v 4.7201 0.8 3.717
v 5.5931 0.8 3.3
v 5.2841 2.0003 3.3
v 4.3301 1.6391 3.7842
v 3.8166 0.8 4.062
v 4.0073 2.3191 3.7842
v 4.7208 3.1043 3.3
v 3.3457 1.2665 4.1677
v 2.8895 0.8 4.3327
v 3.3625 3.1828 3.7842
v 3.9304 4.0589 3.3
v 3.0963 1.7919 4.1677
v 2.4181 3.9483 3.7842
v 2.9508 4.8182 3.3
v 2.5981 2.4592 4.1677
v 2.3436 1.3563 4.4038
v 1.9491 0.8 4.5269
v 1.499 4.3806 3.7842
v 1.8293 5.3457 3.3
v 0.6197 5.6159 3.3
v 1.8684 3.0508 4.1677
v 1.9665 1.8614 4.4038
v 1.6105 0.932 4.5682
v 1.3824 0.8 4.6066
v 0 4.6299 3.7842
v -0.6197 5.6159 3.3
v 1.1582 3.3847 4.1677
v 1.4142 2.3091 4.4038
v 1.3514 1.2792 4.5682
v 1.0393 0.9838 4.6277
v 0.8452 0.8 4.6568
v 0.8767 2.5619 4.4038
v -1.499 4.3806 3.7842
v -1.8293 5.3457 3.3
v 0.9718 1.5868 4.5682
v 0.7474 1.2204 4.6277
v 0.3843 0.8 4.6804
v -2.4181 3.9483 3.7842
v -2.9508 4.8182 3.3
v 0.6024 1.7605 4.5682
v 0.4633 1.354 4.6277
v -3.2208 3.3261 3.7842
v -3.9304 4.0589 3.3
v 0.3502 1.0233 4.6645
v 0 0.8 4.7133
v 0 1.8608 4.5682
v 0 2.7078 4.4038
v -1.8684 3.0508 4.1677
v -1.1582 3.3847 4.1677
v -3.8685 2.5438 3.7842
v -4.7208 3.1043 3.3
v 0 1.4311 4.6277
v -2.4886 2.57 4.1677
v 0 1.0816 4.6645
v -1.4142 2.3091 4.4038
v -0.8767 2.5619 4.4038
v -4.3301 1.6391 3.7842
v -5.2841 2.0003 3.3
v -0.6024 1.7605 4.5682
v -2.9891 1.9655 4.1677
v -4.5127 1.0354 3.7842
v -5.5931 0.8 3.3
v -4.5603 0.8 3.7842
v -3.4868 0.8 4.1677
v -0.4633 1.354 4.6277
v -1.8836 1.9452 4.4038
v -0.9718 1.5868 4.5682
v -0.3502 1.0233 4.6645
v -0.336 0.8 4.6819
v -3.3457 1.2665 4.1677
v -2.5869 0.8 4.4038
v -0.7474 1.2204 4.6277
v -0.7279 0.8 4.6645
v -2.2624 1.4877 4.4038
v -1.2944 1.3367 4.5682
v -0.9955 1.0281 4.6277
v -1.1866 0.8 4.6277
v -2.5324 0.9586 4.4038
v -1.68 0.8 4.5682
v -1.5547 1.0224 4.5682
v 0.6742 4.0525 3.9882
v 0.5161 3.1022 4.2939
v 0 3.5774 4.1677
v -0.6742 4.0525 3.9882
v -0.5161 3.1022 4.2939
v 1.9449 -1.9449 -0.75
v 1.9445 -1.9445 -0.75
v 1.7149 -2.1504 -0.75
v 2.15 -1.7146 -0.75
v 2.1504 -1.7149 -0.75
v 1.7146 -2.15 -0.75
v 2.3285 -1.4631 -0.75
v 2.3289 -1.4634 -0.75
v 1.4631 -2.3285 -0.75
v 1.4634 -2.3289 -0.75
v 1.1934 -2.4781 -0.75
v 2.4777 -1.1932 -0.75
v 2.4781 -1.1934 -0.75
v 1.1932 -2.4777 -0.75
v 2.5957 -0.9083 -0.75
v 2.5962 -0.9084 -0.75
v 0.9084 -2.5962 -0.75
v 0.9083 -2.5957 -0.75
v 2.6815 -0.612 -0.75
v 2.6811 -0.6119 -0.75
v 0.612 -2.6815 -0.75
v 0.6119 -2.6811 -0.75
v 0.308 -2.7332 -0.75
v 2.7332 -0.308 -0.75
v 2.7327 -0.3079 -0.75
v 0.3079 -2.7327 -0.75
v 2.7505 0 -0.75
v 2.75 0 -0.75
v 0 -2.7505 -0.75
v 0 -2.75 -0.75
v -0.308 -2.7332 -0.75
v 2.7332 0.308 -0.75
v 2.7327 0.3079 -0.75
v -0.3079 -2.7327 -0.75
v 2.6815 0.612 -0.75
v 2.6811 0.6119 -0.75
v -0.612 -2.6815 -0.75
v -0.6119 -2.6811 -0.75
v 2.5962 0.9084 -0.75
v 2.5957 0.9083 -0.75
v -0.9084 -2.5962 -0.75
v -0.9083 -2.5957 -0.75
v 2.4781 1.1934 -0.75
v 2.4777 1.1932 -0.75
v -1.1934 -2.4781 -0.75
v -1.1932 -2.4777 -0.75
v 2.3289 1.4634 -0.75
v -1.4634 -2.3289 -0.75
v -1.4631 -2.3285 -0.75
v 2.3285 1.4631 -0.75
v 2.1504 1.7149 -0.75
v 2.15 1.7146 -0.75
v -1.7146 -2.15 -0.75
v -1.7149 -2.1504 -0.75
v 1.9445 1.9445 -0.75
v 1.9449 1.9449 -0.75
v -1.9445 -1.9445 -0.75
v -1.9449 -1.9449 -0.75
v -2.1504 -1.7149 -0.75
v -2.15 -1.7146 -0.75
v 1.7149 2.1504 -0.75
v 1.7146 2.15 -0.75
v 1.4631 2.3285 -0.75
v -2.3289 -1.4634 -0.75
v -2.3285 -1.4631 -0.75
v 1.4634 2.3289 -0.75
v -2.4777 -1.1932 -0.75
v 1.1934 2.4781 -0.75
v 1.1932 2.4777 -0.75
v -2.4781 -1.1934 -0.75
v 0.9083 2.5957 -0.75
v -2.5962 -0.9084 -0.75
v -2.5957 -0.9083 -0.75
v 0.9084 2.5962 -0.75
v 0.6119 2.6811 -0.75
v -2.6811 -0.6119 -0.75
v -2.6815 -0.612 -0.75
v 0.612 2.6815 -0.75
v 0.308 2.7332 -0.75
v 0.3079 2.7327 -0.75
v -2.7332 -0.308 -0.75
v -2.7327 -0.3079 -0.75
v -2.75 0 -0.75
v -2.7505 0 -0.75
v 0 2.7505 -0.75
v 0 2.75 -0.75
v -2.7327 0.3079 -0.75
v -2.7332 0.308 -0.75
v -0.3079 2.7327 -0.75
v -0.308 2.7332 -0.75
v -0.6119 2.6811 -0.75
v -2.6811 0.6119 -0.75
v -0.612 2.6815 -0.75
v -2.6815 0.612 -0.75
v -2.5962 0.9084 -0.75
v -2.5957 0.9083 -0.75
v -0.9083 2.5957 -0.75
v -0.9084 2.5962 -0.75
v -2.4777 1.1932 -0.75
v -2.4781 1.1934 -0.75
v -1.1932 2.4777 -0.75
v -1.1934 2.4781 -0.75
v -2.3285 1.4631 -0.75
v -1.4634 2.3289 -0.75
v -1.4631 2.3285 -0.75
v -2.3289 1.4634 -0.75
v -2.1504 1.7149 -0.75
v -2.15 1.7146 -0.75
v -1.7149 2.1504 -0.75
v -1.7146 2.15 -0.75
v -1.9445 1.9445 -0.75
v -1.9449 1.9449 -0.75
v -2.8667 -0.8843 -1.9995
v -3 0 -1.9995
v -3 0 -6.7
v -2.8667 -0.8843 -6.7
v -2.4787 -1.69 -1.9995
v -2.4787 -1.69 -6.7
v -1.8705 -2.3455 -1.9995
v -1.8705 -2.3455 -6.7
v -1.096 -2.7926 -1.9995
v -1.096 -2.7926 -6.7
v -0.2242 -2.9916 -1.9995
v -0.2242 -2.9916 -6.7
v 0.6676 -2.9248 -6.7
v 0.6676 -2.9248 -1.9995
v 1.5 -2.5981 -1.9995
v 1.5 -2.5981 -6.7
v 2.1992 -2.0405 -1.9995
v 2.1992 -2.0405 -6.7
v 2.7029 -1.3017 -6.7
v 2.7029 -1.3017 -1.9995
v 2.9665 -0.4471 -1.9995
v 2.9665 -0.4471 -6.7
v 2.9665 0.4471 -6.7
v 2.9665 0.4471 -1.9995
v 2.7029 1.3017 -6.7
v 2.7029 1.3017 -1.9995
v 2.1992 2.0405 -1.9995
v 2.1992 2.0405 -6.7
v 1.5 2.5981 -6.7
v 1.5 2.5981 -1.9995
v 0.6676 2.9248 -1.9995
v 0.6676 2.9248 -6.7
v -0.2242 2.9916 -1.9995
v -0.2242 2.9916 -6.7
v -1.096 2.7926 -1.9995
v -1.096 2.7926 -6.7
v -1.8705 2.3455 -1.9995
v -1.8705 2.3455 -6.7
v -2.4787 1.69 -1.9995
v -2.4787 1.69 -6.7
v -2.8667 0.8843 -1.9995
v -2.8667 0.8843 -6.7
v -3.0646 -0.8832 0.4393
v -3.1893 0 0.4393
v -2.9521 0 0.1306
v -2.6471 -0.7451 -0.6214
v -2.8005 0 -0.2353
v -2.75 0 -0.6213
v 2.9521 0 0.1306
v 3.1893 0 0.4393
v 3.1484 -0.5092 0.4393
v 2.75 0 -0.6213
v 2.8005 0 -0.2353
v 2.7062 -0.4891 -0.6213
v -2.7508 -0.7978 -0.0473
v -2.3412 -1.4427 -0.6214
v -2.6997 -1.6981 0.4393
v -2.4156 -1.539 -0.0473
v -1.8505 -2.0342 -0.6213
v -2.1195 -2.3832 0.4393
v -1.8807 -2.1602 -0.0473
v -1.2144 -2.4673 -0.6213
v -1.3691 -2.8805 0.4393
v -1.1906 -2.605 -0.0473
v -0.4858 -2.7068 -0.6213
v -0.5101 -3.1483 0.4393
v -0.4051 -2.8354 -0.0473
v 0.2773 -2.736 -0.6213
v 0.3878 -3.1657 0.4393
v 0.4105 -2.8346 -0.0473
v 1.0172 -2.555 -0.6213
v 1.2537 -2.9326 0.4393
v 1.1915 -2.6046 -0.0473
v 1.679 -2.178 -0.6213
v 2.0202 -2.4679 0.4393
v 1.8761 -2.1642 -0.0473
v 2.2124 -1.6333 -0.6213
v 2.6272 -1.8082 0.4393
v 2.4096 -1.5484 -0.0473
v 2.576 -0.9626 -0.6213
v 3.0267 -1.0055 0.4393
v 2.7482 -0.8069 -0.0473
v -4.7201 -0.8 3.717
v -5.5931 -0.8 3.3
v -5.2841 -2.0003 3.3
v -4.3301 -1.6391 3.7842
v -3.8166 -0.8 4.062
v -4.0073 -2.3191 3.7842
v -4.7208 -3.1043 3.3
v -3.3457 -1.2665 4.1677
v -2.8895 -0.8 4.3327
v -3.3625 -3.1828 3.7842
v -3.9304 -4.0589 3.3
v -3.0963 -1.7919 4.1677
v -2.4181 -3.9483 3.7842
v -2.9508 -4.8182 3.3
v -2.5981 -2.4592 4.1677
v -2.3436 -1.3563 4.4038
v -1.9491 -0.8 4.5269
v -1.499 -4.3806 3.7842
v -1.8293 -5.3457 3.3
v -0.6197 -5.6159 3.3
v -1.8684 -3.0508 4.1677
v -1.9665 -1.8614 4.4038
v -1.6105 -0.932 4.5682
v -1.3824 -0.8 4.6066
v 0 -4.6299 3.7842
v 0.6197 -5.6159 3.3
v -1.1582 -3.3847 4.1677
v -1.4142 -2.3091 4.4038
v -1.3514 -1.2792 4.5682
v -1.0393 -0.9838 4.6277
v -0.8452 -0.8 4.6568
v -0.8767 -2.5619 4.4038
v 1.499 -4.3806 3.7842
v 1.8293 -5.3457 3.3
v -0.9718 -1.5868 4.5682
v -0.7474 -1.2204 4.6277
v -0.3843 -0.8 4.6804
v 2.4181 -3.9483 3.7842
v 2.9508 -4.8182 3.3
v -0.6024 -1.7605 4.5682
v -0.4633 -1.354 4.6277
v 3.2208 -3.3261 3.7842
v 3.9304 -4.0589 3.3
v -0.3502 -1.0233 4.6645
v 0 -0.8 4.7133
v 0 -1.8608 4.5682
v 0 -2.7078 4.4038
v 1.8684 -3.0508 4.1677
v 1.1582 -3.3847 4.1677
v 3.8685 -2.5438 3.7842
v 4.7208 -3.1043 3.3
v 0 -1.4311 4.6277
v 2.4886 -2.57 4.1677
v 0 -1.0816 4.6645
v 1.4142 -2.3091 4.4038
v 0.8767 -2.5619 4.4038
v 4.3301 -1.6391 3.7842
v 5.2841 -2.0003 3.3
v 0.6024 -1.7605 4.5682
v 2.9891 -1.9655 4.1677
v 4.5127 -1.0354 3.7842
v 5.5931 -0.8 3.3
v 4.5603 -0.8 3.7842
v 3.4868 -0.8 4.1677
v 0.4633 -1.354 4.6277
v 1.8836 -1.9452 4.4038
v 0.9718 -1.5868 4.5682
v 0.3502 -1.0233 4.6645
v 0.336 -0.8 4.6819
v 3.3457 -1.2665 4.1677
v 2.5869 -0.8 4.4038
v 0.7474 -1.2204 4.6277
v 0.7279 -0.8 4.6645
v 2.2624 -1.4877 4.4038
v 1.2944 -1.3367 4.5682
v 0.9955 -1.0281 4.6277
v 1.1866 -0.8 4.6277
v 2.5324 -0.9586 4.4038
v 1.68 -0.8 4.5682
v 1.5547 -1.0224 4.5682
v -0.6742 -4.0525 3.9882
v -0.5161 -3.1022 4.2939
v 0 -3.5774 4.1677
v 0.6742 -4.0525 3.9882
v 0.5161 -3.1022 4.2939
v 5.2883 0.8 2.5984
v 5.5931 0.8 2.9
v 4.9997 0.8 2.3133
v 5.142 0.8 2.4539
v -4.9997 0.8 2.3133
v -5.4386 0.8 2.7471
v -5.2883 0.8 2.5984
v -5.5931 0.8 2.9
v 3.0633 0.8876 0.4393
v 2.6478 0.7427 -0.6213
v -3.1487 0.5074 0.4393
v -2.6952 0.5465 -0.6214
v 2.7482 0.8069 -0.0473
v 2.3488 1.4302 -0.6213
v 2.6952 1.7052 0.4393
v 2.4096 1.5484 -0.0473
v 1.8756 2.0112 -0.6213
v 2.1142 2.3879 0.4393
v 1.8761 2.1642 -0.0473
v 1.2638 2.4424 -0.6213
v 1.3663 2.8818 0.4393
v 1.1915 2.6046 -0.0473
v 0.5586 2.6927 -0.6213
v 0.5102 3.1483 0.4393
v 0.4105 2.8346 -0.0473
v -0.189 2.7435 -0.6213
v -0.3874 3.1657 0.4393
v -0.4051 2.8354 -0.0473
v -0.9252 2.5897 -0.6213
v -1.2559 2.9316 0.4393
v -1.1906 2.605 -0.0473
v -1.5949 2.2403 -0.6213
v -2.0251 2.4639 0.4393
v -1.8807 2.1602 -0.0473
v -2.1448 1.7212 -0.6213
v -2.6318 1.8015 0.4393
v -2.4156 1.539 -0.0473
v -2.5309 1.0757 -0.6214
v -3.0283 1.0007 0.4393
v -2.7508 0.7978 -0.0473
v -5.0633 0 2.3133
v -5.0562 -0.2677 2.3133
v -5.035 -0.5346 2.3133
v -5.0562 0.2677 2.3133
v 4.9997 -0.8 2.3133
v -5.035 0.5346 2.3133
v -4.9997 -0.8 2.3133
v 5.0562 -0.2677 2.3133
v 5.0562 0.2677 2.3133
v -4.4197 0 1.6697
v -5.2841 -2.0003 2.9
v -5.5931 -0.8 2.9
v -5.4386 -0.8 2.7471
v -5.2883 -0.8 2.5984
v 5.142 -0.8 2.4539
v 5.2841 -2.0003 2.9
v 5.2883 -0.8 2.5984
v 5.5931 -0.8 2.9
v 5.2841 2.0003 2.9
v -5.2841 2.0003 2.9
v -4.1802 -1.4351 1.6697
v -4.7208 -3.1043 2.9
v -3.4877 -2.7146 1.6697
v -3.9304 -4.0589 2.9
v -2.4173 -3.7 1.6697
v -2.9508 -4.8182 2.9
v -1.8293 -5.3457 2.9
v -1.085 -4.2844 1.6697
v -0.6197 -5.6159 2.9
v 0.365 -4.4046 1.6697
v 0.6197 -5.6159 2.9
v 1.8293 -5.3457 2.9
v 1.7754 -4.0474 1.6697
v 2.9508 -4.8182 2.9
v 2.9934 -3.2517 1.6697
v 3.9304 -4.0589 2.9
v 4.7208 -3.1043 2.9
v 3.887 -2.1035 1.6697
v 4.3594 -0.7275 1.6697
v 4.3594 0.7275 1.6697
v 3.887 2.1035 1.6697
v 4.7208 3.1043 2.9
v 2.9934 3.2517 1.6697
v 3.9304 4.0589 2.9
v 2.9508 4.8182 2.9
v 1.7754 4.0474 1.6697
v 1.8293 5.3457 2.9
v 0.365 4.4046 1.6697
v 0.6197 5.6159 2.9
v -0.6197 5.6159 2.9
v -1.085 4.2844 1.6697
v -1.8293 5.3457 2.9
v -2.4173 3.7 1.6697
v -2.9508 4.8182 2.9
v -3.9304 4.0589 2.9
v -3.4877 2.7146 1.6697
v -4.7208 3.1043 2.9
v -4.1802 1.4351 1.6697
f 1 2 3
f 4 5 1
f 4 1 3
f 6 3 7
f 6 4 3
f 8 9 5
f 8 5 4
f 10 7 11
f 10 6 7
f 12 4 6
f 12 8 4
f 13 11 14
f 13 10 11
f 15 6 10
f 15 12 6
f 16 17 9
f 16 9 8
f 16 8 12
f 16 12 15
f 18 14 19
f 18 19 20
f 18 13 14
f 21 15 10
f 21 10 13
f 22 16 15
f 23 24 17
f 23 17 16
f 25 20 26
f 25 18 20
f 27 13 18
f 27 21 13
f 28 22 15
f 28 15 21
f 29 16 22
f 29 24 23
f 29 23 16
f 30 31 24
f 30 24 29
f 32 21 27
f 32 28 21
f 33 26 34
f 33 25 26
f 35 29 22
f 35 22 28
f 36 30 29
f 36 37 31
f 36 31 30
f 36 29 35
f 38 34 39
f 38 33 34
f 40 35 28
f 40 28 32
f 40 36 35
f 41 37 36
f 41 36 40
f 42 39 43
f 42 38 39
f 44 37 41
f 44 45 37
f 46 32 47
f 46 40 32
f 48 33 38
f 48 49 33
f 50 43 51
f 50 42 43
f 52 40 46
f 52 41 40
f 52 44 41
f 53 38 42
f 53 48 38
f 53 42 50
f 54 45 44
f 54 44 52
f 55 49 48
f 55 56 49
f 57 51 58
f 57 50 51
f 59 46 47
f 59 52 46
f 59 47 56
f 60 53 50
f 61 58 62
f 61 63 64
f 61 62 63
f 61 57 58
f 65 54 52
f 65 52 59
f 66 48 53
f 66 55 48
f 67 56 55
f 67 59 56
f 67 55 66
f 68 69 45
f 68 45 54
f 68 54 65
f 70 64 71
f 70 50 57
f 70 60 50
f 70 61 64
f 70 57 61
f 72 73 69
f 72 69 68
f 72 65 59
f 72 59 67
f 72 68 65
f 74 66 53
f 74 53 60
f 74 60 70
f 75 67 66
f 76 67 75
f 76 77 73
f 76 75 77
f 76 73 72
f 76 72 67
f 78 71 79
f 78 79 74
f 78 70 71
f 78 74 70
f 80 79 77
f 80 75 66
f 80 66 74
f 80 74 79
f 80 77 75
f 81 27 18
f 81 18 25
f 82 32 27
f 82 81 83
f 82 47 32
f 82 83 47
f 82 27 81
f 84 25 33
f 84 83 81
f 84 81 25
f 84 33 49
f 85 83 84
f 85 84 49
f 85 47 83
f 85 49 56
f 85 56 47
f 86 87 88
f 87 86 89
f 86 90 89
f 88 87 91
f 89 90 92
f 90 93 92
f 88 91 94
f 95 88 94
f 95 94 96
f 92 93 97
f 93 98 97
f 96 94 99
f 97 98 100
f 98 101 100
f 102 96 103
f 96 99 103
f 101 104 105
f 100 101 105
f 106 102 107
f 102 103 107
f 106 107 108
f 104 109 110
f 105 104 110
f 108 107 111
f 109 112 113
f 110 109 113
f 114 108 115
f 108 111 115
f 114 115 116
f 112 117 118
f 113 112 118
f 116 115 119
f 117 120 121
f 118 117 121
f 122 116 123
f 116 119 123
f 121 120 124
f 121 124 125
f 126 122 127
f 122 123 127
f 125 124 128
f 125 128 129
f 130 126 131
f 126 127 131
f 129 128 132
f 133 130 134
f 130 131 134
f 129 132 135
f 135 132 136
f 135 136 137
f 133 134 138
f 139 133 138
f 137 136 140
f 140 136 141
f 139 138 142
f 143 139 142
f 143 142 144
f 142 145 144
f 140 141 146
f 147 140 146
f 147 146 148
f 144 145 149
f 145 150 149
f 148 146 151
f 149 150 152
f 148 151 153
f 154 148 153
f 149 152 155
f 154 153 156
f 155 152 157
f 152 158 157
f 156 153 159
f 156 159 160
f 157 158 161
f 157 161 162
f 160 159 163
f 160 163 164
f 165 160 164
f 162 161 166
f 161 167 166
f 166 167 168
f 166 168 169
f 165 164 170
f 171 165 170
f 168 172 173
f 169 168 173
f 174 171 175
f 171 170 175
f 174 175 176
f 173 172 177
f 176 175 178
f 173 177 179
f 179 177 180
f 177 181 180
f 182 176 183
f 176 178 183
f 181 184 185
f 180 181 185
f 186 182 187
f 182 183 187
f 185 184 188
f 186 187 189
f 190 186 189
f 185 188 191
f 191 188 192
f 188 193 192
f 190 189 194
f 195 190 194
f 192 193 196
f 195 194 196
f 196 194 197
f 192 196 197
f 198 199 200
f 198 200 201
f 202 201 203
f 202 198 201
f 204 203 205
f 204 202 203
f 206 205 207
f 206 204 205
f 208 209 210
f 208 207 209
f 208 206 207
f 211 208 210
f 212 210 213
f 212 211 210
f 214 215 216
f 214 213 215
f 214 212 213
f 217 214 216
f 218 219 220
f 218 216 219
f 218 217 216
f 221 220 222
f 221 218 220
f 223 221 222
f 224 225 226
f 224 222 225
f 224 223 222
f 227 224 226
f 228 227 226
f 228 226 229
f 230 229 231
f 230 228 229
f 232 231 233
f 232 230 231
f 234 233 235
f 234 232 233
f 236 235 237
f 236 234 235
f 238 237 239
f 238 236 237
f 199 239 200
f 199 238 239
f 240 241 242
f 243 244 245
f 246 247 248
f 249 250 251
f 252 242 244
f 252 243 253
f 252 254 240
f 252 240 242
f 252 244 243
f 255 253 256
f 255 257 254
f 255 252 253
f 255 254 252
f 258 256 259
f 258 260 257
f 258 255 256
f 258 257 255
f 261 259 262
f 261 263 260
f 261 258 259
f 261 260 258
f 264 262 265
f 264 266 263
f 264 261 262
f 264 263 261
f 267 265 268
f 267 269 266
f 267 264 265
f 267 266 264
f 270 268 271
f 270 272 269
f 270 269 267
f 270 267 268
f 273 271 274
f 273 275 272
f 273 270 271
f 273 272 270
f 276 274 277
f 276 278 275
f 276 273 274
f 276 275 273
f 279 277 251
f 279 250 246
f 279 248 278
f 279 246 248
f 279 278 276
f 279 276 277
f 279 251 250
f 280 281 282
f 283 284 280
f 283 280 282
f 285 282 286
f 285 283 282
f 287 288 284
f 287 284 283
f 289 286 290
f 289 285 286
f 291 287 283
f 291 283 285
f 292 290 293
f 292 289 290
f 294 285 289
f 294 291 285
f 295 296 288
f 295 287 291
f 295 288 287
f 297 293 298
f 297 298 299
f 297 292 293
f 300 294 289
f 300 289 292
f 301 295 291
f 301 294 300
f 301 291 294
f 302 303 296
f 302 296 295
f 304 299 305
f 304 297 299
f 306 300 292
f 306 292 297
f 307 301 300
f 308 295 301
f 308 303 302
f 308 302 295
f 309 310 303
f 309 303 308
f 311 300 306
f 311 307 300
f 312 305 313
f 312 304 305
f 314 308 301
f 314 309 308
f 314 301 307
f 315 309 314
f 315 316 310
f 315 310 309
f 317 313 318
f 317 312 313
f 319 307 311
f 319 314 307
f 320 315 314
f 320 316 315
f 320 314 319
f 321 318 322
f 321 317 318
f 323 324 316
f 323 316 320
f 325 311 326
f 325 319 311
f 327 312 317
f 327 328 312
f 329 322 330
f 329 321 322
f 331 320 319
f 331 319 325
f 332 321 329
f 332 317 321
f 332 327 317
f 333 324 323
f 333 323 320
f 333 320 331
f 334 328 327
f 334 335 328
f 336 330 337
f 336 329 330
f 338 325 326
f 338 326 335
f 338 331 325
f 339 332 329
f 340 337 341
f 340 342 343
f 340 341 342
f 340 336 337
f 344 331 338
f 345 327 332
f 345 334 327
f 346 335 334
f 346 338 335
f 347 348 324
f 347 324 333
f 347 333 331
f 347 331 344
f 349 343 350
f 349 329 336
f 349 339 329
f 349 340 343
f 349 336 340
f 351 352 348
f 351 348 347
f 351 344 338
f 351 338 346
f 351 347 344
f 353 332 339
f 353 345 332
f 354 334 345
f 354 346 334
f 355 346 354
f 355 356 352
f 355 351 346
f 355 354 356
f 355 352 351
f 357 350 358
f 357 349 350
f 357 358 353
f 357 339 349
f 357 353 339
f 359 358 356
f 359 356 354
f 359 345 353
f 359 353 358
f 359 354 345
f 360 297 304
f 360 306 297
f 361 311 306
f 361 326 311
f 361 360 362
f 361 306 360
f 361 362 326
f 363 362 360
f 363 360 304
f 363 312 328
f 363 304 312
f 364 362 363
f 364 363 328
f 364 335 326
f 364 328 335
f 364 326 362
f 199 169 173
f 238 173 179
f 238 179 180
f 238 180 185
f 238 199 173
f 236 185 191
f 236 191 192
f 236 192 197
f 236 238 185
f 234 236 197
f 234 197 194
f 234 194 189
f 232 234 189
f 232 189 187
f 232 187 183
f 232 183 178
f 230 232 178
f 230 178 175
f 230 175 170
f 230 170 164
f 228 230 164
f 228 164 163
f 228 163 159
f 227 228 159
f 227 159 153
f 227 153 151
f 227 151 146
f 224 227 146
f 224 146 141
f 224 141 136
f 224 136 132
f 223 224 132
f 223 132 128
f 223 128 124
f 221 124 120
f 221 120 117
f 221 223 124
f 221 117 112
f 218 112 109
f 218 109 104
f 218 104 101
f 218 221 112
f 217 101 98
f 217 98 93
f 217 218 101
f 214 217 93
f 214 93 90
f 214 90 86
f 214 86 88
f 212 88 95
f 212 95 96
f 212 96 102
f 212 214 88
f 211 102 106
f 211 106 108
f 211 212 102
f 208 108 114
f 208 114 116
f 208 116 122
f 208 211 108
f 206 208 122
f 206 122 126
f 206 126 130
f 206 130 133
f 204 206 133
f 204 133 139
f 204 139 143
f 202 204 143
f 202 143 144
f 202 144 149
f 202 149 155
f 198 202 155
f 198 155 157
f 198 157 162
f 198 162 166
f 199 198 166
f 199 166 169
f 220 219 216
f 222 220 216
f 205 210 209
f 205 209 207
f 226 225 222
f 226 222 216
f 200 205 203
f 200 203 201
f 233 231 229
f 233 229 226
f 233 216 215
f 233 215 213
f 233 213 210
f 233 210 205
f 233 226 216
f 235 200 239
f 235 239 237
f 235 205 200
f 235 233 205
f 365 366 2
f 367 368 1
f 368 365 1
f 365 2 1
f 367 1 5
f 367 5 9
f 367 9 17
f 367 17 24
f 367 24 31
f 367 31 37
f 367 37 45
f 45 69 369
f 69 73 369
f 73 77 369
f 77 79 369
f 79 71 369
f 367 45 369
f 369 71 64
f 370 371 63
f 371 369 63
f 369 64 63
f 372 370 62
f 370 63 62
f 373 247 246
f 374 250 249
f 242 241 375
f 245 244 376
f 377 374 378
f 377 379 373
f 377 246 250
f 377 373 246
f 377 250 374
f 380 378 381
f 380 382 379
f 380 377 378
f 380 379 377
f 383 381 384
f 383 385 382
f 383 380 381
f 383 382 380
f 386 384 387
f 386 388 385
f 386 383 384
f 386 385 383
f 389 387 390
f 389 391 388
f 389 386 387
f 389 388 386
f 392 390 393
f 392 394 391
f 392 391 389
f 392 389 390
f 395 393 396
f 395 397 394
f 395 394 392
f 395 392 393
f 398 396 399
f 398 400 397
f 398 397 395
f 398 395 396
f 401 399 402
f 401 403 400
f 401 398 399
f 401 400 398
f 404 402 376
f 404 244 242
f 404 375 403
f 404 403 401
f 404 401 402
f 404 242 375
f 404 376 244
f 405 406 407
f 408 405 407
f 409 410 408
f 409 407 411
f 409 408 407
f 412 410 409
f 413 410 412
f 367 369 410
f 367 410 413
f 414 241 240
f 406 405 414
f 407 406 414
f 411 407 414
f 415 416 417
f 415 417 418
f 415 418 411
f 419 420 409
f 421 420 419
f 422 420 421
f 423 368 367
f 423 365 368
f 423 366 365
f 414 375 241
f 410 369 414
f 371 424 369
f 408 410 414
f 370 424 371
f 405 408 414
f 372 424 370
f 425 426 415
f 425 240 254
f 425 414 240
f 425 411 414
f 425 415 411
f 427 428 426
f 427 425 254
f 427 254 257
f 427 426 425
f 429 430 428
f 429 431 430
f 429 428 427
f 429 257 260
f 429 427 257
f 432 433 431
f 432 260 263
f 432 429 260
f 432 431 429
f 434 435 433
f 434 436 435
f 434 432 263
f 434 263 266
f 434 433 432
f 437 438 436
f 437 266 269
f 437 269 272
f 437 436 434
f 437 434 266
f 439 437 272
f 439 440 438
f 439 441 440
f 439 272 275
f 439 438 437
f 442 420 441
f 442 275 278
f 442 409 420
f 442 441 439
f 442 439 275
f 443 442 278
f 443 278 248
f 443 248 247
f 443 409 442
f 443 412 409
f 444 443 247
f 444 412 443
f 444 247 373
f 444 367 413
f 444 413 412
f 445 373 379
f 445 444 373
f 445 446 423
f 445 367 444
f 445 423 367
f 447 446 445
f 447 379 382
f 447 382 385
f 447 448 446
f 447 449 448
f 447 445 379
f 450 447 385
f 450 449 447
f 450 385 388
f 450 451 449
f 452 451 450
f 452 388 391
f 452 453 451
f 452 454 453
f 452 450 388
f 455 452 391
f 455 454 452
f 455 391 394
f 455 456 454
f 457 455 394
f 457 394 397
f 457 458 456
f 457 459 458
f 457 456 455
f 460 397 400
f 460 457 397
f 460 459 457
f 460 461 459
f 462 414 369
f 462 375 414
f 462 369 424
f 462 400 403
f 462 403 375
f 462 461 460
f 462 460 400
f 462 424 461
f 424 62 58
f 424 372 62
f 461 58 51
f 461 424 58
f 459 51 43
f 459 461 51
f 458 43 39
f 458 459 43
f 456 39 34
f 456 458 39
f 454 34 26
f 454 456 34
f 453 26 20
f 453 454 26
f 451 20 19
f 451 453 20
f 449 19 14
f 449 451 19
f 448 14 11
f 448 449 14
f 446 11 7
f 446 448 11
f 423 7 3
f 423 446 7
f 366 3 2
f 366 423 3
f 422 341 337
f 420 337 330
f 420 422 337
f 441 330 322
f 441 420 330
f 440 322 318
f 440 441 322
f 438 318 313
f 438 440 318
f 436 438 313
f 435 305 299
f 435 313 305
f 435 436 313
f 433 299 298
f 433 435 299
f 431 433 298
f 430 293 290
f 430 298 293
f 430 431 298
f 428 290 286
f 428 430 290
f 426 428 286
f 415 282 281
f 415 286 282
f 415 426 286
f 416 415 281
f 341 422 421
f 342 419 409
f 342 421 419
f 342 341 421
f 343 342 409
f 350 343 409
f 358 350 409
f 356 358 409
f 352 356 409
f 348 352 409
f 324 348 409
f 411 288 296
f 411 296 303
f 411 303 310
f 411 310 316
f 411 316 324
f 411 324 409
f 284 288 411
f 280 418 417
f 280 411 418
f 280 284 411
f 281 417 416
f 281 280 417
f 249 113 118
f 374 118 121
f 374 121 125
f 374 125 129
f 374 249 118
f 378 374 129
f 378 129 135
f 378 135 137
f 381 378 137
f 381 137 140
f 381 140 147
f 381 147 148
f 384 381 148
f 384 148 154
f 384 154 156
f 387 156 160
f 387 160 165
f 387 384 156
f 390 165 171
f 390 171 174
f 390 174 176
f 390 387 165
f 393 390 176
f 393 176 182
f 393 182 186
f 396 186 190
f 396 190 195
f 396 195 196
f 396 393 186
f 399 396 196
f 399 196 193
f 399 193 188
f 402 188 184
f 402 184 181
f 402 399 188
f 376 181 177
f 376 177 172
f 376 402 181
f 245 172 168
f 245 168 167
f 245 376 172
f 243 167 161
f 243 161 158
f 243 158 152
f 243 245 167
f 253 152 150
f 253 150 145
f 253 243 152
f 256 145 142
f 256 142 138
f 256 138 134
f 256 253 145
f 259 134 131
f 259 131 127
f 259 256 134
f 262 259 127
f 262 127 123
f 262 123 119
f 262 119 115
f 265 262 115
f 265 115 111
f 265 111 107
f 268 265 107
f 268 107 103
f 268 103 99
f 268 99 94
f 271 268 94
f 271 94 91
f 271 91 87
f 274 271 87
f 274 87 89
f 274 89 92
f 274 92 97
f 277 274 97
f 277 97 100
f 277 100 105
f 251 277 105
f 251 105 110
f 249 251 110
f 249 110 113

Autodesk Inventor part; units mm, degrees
ref_plane "WorkPlane11" through (0, 0, 0) normal (0, 0, 1) x (1, 0, 0)
ref_plane "Work Plane2" through (0, 0, -5.7) normal (0, 0, 1) x (1, 0, 0)
ref_plane "WorkPlane9" through (0, 0, 8.3) normal (0, 0, 1) x (1, 0, 0)
sketch "Sketch1" plane through (0, 0, 0) normal (0, 0, 1) x (1, 0, 0)
  point P0 (0, 0)
sketch "Sketch2" plane through (0, 0, 0) normal (0, 0, 1) x (1, 0, 0)
  circle A0 centre (0, 0) radius 2.75
  dimension "d2" = 5.5
extrude "Extrusion1" add sketch "Sketch2" against normal blind 0.75
sketch "Sketch3" plane through (0, 0, -0.75) normal (0, 0, -1) x (-1, 0, 0)
  circle A0 centre (0, 0) radius 3
  circle A1 centre (0, 0) radius 2.75 construction
  dimension "d8" = 6
extrude "Extrusion2" add sketch "Sketch3" along normal blind 5.95
sketch "Sketch4" plane through (0, 0, 0) normal (0, 0, 1) x (1, 0, 0)
  circle A0 centre (0, 0) radius 5.65
  circle A1 centre (0, 0) radius 2.75 construction
  dimension "d12" = 11.3
extrude "Extrusion3" add sketch "Sketch4" along normal blind 3.3
sketch "Sketch5" plane through (0, 0, 0) normal (0, 1, 0) x (-1, 0, 0)
  line L0 (5.65, 0) -> (2.75, 0)
  line L1 (5.65, 2.9) -> (5.65, 0)
  line L2 (2.75, 0) -> (5.65, 2.9)
  line L3 (-5.65, 0) -> (5.65, 0) construction
  line L4 (0, -7.6493) -> (0, 5.8993)
  line L5 (0, -10.359) -> (0, 8.609) projected
  line L6 (5.65, 0) -> (5.65, 3.3) projected
  line L7 (-4.75, 0) -> (4.75, 0) projected
  line L8 (2.75, 0) -> (2.75, -0.75) projected
  dimension "d17" = 45
revolve "Revolution1" cut sketch "Sketch5" angle 360 about axis through (0, 0, -7.6493) along (0, 0, 1)
sketch "Sketch6" plane through (0, 0, 0) normal (0, 1, 0) x (-1, 0, 0)
  line L0 (0, 3.3) -> (0, 4.7133)
  line L1 (0, 3.3) -> (5.65, 3.3)
  arc A0 (5.65, 3.3) -> (0, 4.7133) centre (0, -7.2867) ccw
  line L2 (-5.65, 3.3) -> (5.65, 3.3) construction
  line L3 (0, -7.6493) -> (0, 5.8993)
  line L4 (0, -10.359) -> (0, 8.609) projected
  line L5 (5.65, 2.9) -> (5.65, 3.3) projected
  arc A1 (0, 4.7133) -> (-5.65, 3.3) centre (0, -7.2867) ccw
  dimension "d20" = 12
  dimension "d24" = 5.65
revolve "Revolution2" add sketch "Sketch6" angle 360 about axis through (0, 0, -7.6493) along (0, 0, 1)
fillet "Fillet1" radius 1.5 2 edges at (0, 2.75, 0) (0, -2.75, 0)
chamfer "Chamfer1" distance 1.25 distance2 0.25 1 edges at (3, 0, -0.75) measured on face at (-2.9612, -0.4812, -4.7167)
sketch "Sketch8" plane through (0, 0, 0) normal (0, 1, 0) x (-1, 0, 0)
  line L0 (-5.65, 4.7133) -> (5.65, 4.7133)
  line L1 (5.65, 4.7133) -> (5.65, 2.3133)
  line L2 (5.65, 2.3133) -> (-5.65, 2.3133)
  line L3 (-5.65, 2.3133) -> (-5.65, 4.7133)
  arc A0 (5.65, 3.3) -> (-5.65, 3.3) centre (0, -7.2867) ccw projected
  line L4 (-5.65, 2.9) -> (-5.65, 3.3) projected
  line L5 (5.65, 2.9) -> (5.65, 3.3) projected
  dimension "msp_d31" = 2.4
extrude "Extrusion4" cut sketch "Sketch8" against normal mid plane 1.6
thread "Thread1" size "M6x1" class "6g" standard "ISO Metric profile" full length
ref_plane "MSC_PF1" through (0, 0, 0) normal (1, 0, 0) x (0, 1, 0)
ref_plane "MSC_PT1" through (-5.65, 0, 2.9) normal (0, 0, -1) x (-1, 0, 0)
equation "\"d28\" = r"
equation "\"d29\" = msp_x"
equation "\"d30\" = 0.25 * PTC"
equation "\"d3\" = -msp_x + ParA"
equation "\"d8\" = NND"
equation "\"d9\" = msp_x - ParK + NLG - ParA"
equation "\"d12\" = Dk"
equation "\"d13\" = ParK"
equation "\"msp_d31\" = ParT"
equation "\"msp_d32\" = ParN"
equation "\"d2\" = 0.5 * PTC + msp_mdtds"
equation "\"d20\" = rf"
equation "\"d24\" = 0.5 * Dk"
equation "\"PTC\" = 1"
equation "\"NND\" = 6"
equation "\"msp_x\" = 1.25 * PTC"
equation "\"NLG\" = 10"
equation "\"msp_mdtds\" = NND - PTC"
equation "\"ParK\" = 3.3"
equation "\"ParN\" = 1.6"
equation "\"ParT\" = 2.4"
equation "\"r\" = 1.5"
equation "\"prf_c\" = 0"
equation "\"ParA\" = 2"
equation "\"Dk\" = 11.3"
equation "\"rf\" = 12"
equation "\"ParF\" = 1.4"
equation "\"THREADDIA\" = NND"
equation "\"PG\" = 1.2345"
equation "\"TEMPLATE\" = 1.2345"
properties part number "ISO 2010 - M6x10" material "Stainless Steel, 440C"
